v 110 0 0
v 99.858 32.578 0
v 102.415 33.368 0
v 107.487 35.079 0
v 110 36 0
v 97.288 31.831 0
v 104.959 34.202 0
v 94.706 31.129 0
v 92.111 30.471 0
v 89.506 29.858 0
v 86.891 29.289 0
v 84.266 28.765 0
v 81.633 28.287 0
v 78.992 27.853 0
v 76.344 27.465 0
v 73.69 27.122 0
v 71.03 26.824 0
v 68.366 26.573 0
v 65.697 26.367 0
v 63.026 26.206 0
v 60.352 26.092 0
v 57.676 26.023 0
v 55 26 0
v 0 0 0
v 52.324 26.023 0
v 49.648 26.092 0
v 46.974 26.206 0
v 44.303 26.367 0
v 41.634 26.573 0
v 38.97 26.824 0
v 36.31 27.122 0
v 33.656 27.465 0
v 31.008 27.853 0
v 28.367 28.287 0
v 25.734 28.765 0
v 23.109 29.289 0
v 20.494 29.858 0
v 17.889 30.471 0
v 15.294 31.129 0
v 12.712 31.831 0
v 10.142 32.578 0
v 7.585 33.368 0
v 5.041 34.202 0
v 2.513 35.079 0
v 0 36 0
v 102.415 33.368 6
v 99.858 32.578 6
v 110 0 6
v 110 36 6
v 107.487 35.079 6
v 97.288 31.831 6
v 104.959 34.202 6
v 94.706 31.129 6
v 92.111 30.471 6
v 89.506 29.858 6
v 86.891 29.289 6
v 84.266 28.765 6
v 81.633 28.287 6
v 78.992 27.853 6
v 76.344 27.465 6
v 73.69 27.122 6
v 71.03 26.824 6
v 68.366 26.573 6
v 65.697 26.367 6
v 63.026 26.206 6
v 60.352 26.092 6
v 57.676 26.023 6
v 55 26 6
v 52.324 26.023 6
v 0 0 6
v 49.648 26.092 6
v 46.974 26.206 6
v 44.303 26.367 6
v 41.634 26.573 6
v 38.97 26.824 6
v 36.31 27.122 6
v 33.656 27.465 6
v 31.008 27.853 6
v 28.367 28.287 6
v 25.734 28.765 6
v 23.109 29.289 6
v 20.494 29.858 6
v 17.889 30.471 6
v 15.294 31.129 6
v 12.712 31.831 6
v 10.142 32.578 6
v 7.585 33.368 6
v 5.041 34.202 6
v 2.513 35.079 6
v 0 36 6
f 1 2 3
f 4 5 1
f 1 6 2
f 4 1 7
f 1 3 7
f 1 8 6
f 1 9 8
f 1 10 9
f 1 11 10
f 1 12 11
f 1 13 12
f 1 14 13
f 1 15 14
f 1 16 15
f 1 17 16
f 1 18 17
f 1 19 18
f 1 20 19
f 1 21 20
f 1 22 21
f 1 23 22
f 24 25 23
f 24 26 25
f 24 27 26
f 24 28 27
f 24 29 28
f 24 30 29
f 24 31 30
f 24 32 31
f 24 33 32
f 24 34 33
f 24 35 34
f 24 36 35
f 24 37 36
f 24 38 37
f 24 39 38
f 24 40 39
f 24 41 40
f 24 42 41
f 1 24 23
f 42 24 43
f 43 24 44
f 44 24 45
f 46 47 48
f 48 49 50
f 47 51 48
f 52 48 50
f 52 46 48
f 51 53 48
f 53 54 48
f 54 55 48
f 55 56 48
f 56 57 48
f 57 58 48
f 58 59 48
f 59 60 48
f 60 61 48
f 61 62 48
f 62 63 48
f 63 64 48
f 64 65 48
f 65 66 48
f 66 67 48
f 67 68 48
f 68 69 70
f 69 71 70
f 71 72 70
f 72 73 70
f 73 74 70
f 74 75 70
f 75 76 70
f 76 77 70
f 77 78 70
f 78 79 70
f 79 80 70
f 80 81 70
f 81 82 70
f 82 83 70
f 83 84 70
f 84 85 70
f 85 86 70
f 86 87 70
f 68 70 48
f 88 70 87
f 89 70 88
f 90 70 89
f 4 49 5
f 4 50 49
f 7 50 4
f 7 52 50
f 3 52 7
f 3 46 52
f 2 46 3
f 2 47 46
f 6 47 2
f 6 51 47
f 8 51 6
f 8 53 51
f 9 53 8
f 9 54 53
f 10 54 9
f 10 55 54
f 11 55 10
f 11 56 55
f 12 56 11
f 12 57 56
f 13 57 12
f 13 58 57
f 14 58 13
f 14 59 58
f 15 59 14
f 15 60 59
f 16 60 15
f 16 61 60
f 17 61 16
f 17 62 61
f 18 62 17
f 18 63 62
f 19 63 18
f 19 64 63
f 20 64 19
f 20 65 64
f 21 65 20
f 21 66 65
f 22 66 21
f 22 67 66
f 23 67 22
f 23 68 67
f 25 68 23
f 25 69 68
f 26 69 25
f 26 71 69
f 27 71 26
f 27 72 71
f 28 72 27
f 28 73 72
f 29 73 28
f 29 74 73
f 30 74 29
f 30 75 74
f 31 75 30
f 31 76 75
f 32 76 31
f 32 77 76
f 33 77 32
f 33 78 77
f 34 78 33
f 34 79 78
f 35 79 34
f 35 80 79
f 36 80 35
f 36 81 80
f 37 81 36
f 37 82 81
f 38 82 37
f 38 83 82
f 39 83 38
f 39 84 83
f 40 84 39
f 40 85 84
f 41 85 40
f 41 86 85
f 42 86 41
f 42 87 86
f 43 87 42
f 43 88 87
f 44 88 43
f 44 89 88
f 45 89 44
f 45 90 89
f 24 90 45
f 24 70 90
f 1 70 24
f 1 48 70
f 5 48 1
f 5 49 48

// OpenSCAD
$fn = 32;

// ----------------------------------------------------------------------
// Arc profile plate: notch, 45 points
// ----------------------------------------------------------------------

// --- parameters (mm) ---
bar_l = 110;              // bar length, X
bar_w = 36;               // bar width, Y
notch_depth = 10;         // depth of the arc notch at mid-span
arc_r = 156.25;           // radius of the notch arc
arc_angle = 41.22;        // notch arc angle, degrees
arc_step = 1;             // sampling step of the notch arc, degrees
plate_t = 6;              // plate thickness, Z

profile = [[0, 0], [110, 0], [110, 36], [107.487, 35.079], [104.959, 34.202], [102.415, 33.368], [99.858, 32.578], [97.288, 31.831], [94.706, 31.129], [92.111, 30.471], [89.506, 29.858], [86.891, 29.289], [84.266, 28.765], [81.633, 28.287], [78.992, 27.853], [76.344, 27.465], [73.69, 27.122], [71.03, 26.824], [68.366, 26.573], [65.697, 26.367], [63.026, 26.206], [60.352, 26.092], [57.676, 26.023], [55, 26], [52.324, 26.023], [49.648, 26.092], [46.974, 26.206], [44.303, 26.367], [41.634, 26.573], [38.97, 26.824], [36.31, 27.122], [33.656, 27.465], [31.008, 27.853], [28.367, 28.287], [25.734, 28.765], [23.109, 29.289], [20.494, 29.858], [17.889, 30.471], [15.294, 31.129], [12.712, 31.831], [10.142, 32.578], [7.585, 33.368], [5.041, 34.202], [2.513, 35.079], [0, 36]];  // primary outline, 45 points, counter clockwise

// --- the one profile operation ---
linear_extrude(height = plate_t) polygon(points = profile);
